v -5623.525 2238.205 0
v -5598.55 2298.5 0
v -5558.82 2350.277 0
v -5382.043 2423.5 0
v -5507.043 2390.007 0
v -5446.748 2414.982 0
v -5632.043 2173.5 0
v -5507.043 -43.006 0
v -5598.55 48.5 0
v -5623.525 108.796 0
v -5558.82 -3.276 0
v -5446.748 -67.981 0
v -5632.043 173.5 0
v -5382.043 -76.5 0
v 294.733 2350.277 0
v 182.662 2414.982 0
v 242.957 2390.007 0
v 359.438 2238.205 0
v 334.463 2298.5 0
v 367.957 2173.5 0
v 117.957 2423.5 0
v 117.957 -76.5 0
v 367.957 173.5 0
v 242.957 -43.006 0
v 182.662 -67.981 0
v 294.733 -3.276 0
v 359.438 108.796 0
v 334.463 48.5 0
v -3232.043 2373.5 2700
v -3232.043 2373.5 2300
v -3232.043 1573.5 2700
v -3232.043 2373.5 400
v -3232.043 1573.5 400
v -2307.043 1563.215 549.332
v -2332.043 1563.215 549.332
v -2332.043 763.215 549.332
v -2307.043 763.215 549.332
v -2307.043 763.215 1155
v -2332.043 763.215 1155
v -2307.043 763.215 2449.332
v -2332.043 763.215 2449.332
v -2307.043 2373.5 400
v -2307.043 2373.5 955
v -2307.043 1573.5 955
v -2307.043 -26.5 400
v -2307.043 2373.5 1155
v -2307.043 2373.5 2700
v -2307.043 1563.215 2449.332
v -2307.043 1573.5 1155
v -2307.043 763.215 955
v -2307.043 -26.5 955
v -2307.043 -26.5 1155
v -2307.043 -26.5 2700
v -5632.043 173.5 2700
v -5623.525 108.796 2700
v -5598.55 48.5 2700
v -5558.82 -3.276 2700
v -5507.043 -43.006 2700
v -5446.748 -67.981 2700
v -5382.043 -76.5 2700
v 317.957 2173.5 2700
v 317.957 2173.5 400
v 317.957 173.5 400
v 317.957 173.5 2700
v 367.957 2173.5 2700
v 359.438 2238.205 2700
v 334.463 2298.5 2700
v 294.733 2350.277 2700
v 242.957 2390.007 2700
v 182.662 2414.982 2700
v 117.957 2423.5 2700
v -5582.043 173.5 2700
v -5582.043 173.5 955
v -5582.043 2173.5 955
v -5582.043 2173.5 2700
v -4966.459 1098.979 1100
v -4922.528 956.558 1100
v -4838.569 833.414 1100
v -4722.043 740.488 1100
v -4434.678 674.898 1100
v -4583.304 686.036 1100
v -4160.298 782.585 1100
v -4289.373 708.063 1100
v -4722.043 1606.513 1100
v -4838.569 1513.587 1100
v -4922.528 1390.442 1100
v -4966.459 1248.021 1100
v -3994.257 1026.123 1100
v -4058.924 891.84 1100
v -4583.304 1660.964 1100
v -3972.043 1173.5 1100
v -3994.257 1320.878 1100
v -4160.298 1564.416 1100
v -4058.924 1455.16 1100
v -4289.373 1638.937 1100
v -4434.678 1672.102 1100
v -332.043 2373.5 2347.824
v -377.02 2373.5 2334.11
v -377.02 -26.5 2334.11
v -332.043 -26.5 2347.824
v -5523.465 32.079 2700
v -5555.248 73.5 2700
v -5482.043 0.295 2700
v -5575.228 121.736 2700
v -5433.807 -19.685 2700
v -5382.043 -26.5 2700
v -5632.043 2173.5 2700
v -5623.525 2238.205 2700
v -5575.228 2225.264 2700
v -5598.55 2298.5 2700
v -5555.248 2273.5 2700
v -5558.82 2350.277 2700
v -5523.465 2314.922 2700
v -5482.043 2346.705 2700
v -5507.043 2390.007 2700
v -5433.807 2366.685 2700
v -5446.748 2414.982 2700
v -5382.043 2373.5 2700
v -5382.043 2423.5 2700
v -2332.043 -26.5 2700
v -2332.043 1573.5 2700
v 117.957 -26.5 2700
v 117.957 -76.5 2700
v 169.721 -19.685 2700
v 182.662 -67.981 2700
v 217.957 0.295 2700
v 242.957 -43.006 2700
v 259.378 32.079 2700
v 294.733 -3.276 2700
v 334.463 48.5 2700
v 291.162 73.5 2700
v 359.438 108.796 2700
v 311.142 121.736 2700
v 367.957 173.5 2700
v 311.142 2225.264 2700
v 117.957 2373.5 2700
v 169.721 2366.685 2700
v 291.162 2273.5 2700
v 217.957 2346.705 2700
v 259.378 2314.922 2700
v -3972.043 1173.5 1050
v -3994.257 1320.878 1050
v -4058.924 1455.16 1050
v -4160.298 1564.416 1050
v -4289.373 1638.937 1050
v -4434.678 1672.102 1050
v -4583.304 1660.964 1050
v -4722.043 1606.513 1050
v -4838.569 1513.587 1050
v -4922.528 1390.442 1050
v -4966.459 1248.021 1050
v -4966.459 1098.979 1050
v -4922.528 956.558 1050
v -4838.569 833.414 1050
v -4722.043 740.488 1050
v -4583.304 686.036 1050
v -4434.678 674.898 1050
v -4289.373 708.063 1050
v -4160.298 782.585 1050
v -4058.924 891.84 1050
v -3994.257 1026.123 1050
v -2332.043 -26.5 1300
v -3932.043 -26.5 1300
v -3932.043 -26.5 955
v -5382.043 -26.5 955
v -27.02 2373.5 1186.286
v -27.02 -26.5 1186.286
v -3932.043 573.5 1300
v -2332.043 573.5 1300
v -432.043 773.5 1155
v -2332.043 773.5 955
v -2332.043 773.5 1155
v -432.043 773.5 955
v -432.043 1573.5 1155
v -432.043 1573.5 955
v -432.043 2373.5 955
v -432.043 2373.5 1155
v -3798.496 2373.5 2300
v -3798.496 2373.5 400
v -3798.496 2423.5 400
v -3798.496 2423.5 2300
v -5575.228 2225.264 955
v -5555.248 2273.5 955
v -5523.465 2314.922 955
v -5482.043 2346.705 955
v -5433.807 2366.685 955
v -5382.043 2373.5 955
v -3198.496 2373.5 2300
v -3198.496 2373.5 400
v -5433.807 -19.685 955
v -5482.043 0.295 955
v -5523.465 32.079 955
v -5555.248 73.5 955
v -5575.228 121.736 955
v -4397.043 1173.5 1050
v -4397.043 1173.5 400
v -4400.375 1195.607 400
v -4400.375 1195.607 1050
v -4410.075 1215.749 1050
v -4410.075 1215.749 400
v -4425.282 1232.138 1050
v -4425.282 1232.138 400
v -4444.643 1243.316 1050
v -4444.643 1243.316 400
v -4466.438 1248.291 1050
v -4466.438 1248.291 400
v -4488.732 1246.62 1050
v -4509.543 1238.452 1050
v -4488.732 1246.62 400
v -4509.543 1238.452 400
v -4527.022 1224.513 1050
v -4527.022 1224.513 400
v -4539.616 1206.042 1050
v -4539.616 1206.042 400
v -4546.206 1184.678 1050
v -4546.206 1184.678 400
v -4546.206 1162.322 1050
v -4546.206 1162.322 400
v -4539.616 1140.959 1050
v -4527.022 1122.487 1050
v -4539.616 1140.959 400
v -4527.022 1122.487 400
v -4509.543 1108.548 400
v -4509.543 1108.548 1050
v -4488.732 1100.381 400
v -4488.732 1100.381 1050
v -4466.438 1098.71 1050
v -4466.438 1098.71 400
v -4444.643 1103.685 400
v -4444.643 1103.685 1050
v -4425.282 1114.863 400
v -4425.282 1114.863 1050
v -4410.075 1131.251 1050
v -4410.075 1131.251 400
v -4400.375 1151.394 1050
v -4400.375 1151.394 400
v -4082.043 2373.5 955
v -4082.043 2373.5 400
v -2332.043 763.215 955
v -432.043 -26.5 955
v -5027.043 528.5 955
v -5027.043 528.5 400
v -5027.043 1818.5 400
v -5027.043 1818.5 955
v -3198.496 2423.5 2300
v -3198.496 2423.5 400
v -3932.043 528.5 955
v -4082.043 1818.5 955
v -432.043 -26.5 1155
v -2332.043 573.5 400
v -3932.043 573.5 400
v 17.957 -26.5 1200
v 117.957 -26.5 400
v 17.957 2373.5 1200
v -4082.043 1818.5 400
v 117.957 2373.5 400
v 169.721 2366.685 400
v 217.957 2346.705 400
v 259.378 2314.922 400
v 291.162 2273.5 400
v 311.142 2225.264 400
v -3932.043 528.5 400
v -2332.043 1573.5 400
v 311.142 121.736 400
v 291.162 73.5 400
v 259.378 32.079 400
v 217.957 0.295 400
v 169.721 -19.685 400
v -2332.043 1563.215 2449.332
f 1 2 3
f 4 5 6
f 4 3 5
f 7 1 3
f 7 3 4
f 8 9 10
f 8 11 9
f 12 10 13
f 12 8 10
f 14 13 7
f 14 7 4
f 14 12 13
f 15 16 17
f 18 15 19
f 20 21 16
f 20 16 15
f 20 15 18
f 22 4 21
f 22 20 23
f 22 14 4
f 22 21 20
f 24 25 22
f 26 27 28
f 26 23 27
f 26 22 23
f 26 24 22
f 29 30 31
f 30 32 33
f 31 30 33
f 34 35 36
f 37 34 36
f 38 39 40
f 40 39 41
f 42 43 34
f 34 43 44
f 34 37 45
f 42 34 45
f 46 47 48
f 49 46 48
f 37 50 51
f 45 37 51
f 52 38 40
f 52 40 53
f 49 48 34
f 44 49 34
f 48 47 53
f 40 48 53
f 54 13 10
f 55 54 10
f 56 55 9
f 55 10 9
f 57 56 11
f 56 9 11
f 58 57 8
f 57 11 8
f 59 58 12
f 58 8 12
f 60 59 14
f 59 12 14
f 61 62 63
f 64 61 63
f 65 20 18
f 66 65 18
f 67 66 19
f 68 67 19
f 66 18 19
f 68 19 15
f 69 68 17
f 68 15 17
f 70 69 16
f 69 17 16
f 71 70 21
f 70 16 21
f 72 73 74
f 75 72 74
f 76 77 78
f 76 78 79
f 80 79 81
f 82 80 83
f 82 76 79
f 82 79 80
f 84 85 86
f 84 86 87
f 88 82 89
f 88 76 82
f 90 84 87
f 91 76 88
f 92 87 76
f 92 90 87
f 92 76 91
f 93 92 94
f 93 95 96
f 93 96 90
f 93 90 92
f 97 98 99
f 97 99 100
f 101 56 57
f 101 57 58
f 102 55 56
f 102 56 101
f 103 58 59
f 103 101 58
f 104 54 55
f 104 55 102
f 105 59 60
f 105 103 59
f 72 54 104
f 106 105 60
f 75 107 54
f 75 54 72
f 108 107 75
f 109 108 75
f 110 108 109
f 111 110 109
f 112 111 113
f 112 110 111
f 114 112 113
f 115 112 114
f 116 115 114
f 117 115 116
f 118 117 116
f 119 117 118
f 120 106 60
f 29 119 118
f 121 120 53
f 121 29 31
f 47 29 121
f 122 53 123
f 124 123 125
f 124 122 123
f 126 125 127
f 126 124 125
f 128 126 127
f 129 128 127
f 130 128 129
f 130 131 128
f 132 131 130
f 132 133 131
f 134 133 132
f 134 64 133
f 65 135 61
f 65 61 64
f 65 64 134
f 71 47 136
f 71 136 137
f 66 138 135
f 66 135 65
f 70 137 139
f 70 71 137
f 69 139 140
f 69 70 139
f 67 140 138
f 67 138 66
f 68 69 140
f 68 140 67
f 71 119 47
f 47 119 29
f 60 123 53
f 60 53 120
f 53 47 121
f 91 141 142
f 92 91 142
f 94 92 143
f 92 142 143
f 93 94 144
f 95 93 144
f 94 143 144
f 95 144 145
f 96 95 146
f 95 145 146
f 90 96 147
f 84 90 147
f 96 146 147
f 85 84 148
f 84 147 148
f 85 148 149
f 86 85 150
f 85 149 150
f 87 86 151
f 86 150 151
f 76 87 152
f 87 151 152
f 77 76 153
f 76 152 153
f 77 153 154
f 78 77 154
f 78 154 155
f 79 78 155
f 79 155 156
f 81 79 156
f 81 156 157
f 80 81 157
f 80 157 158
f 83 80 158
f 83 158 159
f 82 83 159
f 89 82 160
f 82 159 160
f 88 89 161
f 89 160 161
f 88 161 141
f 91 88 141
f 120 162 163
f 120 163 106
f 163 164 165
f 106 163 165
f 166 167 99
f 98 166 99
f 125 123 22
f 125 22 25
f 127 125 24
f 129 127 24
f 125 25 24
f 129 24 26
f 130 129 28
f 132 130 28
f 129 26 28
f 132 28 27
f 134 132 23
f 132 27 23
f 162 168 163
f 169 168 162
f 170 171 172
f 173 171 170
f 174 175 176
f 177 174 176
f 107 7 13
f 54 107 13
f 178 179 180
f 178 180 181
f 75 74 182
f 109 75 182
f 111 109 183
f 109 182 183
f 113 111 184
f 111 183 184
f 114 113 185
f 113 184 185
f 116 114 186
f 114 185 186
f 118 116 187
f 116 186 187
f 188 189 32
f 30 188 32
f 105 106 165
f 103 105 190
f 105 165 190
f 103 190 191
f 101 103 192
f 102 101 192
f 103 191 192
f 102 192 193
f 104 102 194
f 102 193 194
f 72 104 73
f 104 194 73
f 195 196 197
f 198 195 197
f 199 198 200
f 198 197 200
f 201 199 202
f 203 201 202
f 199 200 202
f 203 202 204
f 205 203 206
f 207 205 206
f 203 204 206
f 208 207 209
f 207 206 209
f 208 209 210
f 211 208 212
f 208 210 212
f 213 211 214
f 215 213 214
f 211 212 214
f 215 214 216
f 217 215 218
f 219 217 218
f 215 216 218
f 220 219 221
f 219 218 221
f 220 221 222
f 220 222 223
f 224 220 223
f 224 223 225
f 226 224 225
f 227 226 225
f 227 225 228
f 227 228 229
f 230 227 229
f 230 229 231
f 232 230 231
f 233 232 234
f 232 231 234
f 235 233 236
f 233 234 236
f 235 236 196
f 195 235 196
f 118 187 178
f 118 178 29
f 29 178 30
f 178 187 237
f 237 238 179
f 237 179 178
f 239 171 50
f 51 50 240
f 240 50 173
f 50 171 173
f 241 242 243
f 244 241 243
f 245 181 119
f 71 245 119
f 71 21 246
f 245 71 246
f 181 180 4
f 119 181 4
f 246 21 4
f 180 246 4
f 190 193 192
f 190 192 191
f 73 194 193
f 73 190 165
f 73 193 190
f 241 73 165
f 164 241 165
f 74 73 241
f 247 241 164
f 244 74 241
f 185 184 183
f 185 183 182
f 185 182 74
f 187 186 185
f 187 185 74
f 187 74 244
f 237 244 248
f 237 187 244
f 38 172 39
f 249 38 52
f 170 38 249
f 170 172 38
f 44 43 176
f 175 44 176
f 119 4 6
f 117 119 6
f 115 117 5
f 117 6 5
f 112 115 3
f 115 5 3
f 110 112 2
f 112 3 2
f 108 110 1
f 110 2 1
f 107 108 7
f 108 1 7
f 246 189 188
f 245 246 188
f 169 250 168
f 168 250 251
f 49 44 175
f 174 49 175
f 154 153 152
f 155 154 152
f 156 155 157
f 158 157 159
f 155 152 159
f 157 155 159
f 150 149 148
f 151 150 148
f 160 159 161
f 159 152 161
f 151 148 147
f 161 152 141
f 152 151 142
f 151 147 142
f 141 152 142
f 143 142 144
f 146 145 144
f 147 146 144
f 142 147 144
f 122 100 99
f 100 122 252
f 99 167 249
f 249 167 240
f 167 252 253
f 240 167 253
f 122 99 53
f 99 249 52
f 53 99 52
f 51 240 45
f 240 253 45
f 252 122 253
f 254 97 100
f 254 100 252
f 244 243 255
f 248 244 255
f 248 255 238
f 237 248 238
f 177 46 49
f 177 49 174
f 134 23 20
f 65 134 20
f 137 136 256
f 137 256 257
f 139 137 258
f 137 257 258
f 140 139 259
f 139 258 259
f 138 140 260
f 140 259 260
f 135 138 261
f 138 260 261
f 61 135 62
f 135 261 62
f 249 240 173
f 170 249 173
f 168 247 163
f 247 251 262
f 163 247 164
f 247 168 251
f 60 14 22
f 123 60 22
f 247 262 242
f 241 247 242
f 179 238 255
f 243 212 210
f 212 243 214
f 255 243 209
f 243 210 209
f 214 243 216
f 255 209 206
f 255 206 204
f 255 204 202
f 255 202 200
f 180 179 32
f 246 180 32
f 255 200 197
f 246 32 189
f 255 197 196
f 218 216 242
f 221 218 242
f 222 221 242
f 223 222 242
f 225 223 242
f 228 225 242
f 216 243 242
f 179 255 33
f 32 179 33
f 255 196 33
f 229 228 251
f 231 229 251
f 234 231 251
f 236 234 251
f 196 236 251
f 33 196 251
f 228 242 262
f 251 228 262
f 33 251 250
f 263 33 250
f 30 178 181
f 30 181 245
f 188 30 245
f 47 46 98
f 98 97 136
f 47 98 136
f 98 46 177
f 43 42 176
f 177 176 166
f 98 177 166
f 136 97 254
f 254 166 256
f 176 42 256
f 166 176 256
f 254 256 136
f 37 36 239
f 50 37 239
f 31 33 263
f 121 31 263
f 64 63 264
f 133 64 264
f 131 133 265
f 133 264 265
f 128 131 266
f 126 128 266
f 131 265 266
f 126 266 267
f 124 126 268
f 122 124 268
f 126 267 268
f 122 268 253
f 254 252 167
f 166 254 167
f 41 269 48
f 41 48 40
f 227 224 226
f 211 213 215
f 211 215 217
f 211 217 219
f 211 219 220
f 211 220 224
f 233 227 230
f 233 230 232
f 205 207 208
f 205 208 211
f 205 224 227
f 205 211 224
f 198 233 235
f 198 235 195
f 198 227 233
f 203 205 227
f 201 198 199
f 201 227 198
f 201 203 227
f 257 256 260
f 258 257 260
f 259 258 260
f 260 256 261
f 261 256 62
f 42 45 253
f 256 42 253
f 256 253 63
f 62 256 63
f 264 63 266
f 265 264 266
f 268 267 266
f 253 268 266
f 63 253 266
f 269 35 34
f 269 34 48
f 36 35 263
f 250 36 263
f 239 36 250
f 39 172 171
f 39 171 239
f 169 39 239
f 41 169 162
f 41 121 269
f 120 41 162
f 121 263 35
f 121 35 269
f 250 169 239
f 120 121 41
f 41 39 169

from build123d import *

# Parameters (mm, degrees)
F1_DEPTH  = 2700
F3_DEPTH  = 400
F5_DEPTH  = 555
F7_DEPTH  = 900
F9_DEPTH  = 2400
F10_W     = 1900
F10_H     = 800
F11_DEPTH = 200
F12_W     = 800
F12_H     = 1900
F12_H_2   = 200
F13_DEPTH = 25
F14_W     = 600
F14_H     = 1900
F15_DEPTH = 55
F16_R     = 75
F17_DEPTH = 650
F18_R     = 500
F18_R_2   = 75
F19_DEPTH = 50
F21_DEPTH = 2300


with BuildPart() as f1:
    # F0 (on Top) → F1 (new body)
    with BuildSketch(Plane.XY):
        with BuildLine():
            Line((117.95676, 2423.500269), (-5382.04324, 2423.500269))
            ThreePointArc((-5382.04324, 2423.500269), (-5558.819935, 2350.276964), (-5632.04324, 2173.500269))
            Line((-5632.04324, 2173.500269), (-5632.04324, 173.500269))
            ThreePointArc((-5632.04324, 173.500269), (-5558.819935, -3.276427), (-5382.04324, -76.499731))
            Line((-5382.04324, -76.499731), (117.95676, -76.499731))
            ThreePointArc((117.95676, -76.499731), (294.733456, -3.276427), (367.95676, 173.500269))
            Line((367.95676, 173.500269), (367.95676, 2173.500269))
            ThreePointArc((367.95676, 2173.500269), (294.733456, 2350.276964), (117.95676, 2423.500269))
        make_face()
        with BuildLine():
            ThreePointArc((-5382.04324, -26.499731), (-5523.464596, 32.078912), (-5582.04324, 173.500269))
            Line((-5582.04324, 173.500269), (-5582.04324, 2173.500269))
            ThreePointArc((-5582.04324, 2173.500269), (-5523.464596, 2314.921625), (-5382.04324, 2373.500269))
            Line((-5382.04324, 2373.500269), (117.95676, 2373.500269))
            ThreePointArc((117.95676, 2373.500269), (259.378116, 2314.921625), (317.95676, 2173.500269))
            Line((317.95676, 2173.500269), (317.95676, 173.500269))
            ThreePointArc((317.95676, 173.500269), (259.378116, 32.078912), (117.95676, -26.499731))
            Line((117.95676, -26.499731), (-5382.04324, -26.499731))
        make_face(mode=Mode.SUBTRACT)
    extrude(amount=F1_DEPTH)

    # F2 (on face) → F3 (join)
    with BuildSketch(Plane(origin=(0, 0, 0), x_dir=(1, 0, 0), z_dir=(0, 0, -1))):
        with BuildLine():
            ThreePointArc((-5382.04324, 26.499731), (-5523.464596, -32.078912), (-5582.04324, -173.500269))
            Line((-5582.04324, -173.500269), (-5582.04324, -2173.500269))
            ThreePointArc((-5582.04324, -2173.500269), (-5523.464596, -2314.921625), (-5382.04324, -2373.500269))
            Line((-5382.04324, -2373.500269), (117.95676, -2373.500269))
            ThreePointArc((117.95676, -2373.500269), (259.378116, -2314.921625), (317.95676, -2173.500269))
            Line((317.95676, -2173.500269), (317.95676, -173.500269))
            ThreePointArc((317.95676, -173.500269), (259.378116, -32.078912), (117.95676, 26.499731))
            Line((117.95676, 26.499731), (-5382.04324, 26.499731))
        make_face()
    extrude(amount=-F3_DEPTH)

    # F4 (on face) → F5 (join)
    with BuildSketch(Plane.XY.offset(400)):
        with BuildLine():
            Line((-4082.04324, 1818.500269), (-4082.04324, 2373.500269))
            Line((-4082.04324, 2373.500269), (-5382.04324, 2373.500269))
            ThreePointArc((-5382.04324, 2373.500269), (-5523.464596, 2314.921625), (-5582.04324, 2173.500269))
            Line((-5582.04324, 2173.500269), (-5582.04324, 173.500269))
            ThreePointArc((-5582.04324, 173.500269), (-5523.464596, 32.078912), (-5382.04324, -26.499731))
            Line((-5382.04324, -26.499731), (-3932.04324, -26.499731))
            Line((-3932.04324, -26.499731), (-3932.04324, 528.500269))
            Line((-3932.04324, 528.500269), (-5027.04324, 528.500269))
            Line((-5027.04324, 528.500269), (-5027.04324, 1818.500269))
            Line((-5027.04324, 1818.500269), (-4082.04324, 1818.500269))
        make_face()
    extrude(amount=F5_DEPTH)

    # F6 (on face) → F7 (join)
    with BuildSketch(Plane.XY.offset(400)):
        Polygon((-3932.04324, -26.499731), (-2332.04324, -26.499731), (-2332.04324, 573.500269), (-3932.04324, 573.500269), (-3932.04324, 528.500269), align=None)
    extrude(amount=F7_DEPTH)

    # F8 (on face) → F9 (join)
    with BuildSketch(Plane(origin=(0, -26.499731, 0), x_dir=(-1, 0, 0), z_dir=(0, 1, 0))):
        Polygon((27.01952, 1186.285617), (377.01952, 2334.109646), (332.04324, 2347.824028), (-17.95676, 1200), align=None)
    extrude(amount=F9_DEPTH)

    # F10 (on face) → F11 (join)
    with BuildSketch(Plane.XY.offset(955)):
        with Locations((-1382.04324, 373.500269)):
            Rectangle(F10_W, F10_H)
        with Locations((-1382.04324, 1973.500269)):
            Rectangle(F10_W, F10_H)
    extrude(amount=F11_DEPTH)

    # F12 (on face) → F13 (join)
    with BuildSketch(Plane(origin=(-2332.04324, 0, 0), x_dir=(0, -1, 0), z_dir=(-1, 0, 0))):
        Polygon((-2373.500269, 955), (-2373.500269, 400), (26.499731, 400), (26.499731, 2700), (-2373.500269, 2700), (-2373.500269, 1155), (-1573.500269, 1155), (-1573.500269, 955), align=None)
        with Locations((-1163.214898, 1499.331903)):
            Rectangle(F12_W, F12_H, mode=Mode.SUBTRACT)
        with Locations((-1973.500269, 1055)):
            Rectangle(F12_W, F12_H_2)
    extrude(amount=-F13_DEPTH)

    # F14 (on face) → F15 (cut)
    with BuildSketch(Plane.XZ.offset(-2373.500269)):
        with Locations((-3498.49577, 1350)):
            Rectangle(F14_W, F14_H)
    extrude(amount=-F15_DEPTH, mode=Mode.SUBTRACT)

    # F16 (on face) → F17 (join)
    with BuildSketch(Plane.XY.offset(400)):
        with Locations((-4472.04324, 1173.500269)):
            Circle(F16_R)
    extrude(amount=F17_DEPTH)

    # F20 (on face) → F21 (join)
    with BuildSketch(Plane.XY.offset(400)):
        Polygon((-2332.04324, 1573.500269), (-2332.04324, 2373.500269), (-3198.49577, 2373.500269), (-3232.04324, 2373.500269), (-3232.04324, 1573.500269), align=None)
    extrude(amount=F21_DEPTH)


with BuildPart() as f19:
    # F18 (on face) → F19 (new body)
    with BuildSketch(Plane.XY.offset(1050)):
        with Locations((-4472.04324, 1173.500269)):
            Circle(F18_R)
        with Locations((-4472.04324, 1173.500269)):
            Circle(F18_R_2, mode=Mode.SUBTRACT)
        with Locations((-4472.04324, 1173.500269)):
            Circle(F18_R_2)
    extrude(amount=F19_DEPTH)


solid = Compound([f1.part, f19.part])
